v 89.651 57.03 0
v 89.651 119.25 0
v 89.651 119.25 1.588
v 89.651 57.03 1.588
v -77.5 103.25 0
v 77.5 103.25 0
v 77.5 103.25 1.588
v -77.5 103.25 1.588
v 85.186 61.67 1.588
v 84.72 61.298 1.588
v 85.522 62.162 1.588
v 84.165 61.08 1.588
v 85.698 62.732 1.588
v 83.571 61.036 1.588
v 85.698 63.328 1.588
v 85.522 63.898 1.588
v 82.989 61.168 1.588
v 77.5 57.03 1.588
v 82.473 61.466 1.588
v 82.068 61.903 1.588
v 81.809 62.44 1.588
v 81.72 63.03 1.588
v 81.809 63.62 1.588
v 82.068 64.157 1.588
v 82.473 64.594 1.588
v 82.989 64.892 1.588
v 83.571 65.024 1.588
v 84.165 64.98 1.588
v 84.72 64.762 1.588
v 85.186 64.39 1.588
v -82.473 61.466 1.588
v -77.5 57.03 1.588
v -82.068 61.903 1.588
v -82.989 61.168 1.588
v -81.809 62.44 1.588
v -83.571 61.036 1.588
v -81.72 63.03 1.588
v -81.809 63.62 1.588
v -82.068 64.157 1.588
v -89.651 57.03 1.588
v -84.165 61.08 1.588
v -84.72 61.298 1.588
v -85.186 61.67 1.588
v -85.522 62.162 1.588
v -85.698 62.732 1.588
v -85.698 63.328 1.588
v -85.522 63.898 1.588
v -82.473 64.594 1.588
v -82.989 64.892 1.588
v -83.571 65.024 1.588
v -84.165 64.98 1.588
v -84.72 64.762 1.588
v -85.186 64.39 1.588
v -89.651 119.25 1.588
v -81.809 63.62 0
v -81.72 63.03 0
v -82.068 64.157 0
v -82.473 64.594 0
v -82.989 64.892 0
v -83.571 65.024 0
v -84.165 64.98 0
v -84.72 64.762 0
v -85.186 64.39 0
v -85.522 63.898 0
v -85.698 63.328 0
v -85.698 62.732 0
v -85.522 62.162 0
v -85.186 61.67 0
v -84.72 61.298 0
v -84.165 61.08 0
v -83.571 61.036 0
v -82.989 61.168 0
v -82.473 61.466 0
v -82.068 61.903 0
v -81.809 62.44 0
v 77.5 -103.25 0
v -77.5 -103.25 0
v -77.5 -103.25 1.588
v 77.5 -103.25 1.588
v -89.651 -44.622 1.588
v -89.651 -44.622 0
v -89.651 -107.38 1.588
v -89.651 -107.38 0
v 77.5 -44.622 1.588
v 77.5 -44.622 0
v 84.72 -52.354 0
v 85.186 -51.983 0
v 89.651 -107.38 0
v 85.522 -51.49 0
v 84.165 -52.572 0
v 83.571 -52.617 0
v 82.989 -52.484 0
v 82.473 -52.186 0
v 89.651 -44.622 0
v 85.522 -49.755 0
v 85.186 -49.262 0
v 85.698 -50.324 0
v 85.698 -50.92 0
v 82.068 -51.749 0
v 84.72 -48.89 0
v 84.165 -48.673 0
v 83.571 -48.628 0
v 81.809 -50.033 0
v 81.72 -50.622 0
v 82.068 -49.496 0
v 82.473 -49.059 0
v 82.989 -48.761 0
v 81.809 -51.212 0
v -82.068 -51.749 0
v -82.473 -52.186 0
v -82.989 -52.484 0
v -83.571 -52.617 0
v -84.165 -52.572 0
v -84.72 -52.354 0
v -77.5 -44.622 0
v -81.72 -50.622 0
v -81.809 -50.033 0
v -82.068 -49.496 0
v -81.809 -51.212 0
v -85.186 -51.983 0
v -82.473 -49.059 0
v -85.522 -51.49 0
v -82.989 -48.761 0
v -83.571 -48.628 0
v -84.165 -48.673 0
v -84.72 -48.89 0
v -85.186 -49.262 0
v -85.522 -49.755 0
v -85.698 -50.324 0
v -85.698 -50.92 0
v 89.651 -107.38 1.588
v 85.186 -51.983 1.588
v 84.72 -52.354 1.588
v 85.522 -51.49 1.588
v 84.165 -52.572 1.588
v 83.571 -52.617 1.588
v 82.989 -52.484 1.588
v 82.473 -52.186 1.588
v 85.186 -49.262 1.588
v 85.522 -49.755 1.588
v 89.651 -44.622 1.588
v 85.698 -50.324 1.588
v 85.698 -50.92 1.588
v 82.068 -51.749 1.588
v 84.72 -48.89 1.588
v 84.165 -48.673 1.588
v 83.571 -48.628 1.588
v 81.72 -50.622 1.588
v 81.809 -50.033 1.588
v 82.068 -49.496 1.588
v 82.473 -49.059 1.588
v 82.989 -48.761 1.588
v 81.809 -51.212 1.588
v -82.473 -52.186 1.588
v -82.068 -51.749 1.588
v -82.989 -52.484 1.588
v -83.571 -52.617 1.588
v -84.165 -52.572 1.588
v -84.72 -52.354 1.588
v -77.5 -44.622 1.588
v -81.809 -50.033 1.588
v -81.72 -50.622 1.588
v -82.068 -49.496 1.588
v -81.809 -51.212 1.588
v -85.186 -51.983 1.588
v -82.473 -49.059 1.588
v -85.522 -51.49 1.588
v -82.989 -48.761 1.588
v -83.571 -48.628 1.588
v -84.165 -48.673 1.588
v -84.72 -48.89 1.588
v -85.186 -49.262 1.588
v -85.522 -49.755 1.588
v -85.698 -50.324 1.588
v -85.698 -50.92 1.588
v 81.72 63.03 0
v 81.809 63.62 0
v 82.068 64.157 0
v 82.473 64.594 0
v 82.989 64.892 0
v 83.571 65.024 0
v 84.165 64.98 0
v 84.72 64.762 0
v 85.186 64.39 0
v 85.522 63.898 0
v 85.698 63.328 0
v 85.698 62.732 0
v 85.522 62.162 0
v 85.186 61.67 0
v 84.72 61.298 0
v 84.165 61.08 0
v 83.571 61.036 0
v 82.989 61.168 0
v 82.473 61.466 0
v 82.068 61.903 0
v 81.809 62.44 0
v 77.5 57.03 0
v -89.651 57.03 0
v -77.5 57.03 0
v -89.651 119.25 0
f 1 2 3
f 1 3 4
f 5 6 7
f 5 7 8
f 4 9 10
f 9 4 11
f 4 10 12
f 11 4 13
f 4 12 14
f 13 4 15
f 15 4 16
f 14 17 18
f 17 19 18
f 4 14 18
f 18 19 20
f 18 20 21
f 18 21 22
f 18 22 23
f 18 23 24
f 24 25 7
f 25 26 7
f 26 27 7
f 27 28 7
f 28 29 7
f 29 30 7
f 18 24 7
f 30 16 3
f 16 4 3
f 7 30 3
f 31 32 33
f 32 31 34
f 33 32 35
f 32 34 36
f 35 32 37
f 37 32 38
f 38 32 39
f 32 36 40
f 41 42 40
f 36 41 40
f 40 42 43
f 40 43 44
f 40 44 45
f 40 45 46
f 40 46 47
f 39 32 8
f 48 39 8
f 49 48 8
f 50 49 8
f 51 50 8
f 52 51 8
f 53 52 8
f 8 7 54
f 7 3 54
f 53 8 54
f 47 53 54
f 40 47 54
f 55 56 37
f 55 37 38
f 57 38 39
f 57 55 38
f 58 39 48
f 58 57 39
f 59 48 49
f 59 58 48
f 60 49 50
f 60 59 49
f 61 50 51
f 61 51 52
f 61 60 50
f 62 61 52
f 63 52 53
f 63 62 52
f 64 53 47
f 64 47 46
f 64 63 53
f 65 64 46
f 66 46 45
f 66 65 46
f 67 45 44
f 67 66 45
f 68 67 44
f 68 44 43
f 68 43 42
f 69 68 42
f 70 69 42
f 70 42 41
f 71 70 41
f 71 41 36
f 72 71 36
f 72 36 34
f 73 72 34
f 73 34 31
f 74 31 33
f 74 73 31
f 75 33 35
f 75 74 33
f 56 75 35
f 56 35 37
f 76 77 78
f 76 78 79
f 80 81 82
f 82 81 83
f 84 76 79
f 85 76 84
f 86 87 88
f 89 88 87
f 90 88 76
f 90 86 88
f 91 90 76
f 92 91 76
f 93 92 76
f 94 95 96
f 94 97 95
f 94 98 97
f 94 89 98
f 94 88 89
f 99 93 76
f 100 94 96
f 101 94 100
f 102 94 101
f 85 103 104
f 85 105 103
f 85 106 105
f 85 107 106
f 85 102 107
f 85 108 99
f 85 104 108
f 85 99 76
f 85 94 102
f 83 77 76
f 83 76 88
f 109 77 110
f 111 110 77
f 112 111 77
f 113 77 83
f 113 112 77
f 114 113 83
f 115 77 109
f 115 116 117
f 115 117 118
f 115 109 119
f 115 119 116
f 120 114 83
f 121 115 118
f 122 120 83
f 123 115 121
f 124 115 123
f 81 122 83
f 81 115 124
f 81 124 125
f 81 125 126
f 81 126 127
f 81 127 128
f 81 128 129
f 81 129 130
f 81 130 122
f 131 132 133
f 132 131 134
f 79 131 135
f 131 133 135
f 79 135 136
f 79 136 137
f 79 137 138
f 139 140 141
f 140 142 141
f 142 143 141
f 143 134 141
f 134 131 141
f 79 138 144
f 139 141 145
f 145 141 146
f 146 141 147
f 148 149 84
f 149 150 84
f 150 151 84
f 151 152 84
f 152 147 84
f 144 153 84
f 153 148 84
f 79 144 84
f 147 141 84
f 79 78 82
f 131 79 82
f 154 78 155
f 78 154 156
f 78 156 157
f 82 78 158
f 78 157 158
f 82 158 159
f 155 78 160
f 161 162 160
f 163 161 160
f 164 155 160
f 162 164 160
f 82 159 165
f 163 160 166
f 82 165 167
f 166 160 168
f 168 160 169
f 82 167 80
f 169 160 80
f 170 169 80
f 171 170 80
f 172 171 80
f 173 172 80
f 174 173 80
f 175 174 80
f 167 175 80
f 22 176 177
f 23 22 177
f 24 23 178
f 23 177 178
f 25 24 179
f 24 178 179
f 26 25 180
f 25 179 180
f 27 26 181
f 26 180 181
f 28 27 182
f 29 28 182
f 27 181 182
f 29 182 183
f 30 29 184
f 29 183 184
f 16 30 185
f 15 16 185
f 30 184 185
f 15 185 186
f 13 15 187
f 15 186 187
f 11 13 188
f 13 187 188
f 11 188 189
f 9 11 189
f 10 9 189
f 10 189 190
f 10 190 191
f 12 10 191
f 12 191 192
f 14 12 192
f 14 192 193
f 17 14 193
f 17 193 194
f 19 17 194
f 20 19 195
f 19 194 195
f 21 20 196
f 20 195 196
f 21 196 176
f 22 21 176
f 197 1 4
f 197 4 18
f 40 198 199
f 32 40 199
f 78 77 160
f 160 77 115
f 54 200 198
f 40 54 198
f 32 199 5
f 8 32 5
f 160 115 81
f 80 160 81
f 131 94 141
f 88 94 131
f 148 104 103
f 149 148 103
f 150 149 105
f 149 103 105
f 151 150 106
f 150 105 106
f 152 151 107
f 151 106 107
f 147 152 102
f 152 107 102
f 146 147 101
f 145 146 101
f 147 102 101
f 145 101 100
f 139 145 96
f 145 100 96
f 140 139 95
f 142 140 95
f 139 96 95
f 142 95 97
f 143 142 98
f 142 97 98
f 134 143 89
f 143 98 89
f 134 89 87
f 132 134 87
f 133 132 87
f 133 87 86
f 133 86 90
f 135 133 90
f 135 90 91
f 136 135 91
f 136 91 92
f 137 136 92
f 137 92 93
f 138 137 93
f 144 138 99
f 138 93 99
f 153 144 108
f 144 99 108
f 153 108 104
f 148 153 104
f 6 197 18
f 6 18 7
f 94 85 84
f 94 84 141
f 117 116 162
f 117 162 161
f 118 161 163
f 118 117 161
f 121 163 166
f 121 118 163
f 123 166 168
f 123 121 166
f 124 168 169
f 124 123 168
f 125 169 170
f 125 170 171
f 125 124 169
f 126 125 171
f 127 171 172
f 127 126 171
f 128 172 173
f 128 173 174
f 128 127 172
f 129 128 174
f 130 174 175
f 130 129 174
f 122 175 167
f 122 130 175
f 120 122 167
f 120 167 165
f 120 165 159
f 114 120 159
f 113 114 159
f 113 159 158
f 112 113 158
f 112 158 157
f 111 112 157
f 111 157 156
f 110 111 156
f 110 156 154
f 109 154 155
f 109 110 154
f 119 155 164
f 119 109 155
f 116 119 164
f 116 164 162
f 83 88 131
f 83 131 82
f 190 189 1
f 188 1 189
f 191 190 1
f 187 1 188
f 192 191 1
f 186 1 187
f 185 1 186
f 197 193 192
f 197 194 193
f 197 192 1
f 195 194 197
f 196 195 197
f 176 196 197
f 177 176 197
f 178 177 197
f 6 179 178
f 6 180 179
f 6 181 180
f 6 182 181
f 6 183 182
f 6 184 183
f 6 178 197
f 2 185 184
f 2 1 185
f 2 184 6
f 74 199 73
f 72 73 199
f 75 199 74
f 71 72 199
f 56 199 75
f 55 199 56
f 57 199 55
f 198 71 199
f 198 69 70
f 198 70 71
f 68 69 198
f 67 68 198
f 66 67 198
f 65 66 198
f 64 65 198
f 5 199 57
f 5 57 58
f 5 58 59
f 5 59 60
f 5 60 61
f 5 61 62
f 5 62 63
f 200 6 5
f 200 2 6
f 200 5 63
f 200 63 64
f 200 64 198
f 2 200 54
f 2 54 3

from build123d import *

# Parameters (mm, degrees)
SKETCH1_R               = 2
REPEATING_FRAME_DEPTH   = 1.5875
REPEATING_FRAME_2_DEPTH = 1.5875


with BuildPart() as part:
    # Sketch1 → Repeating Frame (new body)
    with BuildSketch(Plane.XY):
        Polygon((-77.5, 103.25), (0, 103.25), (0, 119.25), (-89.6514, 119.25), (-89.6514, 57.03), (-77.5, 57.03), align=None)
        with Locations((-83.72, 63.03)):
            Circle(SKETCH1_R, mode=Mode.SUBTRACT)
    repeating_frame = extrude(amount=REPEATING_FRAME_DEPTH)


with BuildPart() as body_2:
    # Sketch1 → Repeating Frame 2 (new body)
    with BuildSketch(Plane.XY):
        Polygon((-89.6514, -107.38), (0, -107.38), (0, -103.25), (-77.5, -103.25), (-77.5, -44.6224), (-89.6514, -44.6224), align=None)
        with Locations((-83.72, -50.6224)):
            Circle(SKETCH1_R, mode=Mode.SUBTRACT)
    repeating_frame_2 = extrude(amount=REPEATING_FRAME_2_DEPTH)


with BuildPart() as part_1:
    add(part.part)

    add(body_2.part)  # Mirror1 merges body 2
    # Mirror1: Repeating Frame, Repeating Frame 2 across plane
    add(repeating_frame.mirror(Plane(origin=(0, 0, 0), x_dir=(0, 0, 1), z_dir=(1, 0, 0))))
    add(repeating_frame_2.mirror(Plane(origin=(0, 0, 0), x_dir=(0, 0, 1), z_dir=(1, 0, 0))))


solid = part_1.part
